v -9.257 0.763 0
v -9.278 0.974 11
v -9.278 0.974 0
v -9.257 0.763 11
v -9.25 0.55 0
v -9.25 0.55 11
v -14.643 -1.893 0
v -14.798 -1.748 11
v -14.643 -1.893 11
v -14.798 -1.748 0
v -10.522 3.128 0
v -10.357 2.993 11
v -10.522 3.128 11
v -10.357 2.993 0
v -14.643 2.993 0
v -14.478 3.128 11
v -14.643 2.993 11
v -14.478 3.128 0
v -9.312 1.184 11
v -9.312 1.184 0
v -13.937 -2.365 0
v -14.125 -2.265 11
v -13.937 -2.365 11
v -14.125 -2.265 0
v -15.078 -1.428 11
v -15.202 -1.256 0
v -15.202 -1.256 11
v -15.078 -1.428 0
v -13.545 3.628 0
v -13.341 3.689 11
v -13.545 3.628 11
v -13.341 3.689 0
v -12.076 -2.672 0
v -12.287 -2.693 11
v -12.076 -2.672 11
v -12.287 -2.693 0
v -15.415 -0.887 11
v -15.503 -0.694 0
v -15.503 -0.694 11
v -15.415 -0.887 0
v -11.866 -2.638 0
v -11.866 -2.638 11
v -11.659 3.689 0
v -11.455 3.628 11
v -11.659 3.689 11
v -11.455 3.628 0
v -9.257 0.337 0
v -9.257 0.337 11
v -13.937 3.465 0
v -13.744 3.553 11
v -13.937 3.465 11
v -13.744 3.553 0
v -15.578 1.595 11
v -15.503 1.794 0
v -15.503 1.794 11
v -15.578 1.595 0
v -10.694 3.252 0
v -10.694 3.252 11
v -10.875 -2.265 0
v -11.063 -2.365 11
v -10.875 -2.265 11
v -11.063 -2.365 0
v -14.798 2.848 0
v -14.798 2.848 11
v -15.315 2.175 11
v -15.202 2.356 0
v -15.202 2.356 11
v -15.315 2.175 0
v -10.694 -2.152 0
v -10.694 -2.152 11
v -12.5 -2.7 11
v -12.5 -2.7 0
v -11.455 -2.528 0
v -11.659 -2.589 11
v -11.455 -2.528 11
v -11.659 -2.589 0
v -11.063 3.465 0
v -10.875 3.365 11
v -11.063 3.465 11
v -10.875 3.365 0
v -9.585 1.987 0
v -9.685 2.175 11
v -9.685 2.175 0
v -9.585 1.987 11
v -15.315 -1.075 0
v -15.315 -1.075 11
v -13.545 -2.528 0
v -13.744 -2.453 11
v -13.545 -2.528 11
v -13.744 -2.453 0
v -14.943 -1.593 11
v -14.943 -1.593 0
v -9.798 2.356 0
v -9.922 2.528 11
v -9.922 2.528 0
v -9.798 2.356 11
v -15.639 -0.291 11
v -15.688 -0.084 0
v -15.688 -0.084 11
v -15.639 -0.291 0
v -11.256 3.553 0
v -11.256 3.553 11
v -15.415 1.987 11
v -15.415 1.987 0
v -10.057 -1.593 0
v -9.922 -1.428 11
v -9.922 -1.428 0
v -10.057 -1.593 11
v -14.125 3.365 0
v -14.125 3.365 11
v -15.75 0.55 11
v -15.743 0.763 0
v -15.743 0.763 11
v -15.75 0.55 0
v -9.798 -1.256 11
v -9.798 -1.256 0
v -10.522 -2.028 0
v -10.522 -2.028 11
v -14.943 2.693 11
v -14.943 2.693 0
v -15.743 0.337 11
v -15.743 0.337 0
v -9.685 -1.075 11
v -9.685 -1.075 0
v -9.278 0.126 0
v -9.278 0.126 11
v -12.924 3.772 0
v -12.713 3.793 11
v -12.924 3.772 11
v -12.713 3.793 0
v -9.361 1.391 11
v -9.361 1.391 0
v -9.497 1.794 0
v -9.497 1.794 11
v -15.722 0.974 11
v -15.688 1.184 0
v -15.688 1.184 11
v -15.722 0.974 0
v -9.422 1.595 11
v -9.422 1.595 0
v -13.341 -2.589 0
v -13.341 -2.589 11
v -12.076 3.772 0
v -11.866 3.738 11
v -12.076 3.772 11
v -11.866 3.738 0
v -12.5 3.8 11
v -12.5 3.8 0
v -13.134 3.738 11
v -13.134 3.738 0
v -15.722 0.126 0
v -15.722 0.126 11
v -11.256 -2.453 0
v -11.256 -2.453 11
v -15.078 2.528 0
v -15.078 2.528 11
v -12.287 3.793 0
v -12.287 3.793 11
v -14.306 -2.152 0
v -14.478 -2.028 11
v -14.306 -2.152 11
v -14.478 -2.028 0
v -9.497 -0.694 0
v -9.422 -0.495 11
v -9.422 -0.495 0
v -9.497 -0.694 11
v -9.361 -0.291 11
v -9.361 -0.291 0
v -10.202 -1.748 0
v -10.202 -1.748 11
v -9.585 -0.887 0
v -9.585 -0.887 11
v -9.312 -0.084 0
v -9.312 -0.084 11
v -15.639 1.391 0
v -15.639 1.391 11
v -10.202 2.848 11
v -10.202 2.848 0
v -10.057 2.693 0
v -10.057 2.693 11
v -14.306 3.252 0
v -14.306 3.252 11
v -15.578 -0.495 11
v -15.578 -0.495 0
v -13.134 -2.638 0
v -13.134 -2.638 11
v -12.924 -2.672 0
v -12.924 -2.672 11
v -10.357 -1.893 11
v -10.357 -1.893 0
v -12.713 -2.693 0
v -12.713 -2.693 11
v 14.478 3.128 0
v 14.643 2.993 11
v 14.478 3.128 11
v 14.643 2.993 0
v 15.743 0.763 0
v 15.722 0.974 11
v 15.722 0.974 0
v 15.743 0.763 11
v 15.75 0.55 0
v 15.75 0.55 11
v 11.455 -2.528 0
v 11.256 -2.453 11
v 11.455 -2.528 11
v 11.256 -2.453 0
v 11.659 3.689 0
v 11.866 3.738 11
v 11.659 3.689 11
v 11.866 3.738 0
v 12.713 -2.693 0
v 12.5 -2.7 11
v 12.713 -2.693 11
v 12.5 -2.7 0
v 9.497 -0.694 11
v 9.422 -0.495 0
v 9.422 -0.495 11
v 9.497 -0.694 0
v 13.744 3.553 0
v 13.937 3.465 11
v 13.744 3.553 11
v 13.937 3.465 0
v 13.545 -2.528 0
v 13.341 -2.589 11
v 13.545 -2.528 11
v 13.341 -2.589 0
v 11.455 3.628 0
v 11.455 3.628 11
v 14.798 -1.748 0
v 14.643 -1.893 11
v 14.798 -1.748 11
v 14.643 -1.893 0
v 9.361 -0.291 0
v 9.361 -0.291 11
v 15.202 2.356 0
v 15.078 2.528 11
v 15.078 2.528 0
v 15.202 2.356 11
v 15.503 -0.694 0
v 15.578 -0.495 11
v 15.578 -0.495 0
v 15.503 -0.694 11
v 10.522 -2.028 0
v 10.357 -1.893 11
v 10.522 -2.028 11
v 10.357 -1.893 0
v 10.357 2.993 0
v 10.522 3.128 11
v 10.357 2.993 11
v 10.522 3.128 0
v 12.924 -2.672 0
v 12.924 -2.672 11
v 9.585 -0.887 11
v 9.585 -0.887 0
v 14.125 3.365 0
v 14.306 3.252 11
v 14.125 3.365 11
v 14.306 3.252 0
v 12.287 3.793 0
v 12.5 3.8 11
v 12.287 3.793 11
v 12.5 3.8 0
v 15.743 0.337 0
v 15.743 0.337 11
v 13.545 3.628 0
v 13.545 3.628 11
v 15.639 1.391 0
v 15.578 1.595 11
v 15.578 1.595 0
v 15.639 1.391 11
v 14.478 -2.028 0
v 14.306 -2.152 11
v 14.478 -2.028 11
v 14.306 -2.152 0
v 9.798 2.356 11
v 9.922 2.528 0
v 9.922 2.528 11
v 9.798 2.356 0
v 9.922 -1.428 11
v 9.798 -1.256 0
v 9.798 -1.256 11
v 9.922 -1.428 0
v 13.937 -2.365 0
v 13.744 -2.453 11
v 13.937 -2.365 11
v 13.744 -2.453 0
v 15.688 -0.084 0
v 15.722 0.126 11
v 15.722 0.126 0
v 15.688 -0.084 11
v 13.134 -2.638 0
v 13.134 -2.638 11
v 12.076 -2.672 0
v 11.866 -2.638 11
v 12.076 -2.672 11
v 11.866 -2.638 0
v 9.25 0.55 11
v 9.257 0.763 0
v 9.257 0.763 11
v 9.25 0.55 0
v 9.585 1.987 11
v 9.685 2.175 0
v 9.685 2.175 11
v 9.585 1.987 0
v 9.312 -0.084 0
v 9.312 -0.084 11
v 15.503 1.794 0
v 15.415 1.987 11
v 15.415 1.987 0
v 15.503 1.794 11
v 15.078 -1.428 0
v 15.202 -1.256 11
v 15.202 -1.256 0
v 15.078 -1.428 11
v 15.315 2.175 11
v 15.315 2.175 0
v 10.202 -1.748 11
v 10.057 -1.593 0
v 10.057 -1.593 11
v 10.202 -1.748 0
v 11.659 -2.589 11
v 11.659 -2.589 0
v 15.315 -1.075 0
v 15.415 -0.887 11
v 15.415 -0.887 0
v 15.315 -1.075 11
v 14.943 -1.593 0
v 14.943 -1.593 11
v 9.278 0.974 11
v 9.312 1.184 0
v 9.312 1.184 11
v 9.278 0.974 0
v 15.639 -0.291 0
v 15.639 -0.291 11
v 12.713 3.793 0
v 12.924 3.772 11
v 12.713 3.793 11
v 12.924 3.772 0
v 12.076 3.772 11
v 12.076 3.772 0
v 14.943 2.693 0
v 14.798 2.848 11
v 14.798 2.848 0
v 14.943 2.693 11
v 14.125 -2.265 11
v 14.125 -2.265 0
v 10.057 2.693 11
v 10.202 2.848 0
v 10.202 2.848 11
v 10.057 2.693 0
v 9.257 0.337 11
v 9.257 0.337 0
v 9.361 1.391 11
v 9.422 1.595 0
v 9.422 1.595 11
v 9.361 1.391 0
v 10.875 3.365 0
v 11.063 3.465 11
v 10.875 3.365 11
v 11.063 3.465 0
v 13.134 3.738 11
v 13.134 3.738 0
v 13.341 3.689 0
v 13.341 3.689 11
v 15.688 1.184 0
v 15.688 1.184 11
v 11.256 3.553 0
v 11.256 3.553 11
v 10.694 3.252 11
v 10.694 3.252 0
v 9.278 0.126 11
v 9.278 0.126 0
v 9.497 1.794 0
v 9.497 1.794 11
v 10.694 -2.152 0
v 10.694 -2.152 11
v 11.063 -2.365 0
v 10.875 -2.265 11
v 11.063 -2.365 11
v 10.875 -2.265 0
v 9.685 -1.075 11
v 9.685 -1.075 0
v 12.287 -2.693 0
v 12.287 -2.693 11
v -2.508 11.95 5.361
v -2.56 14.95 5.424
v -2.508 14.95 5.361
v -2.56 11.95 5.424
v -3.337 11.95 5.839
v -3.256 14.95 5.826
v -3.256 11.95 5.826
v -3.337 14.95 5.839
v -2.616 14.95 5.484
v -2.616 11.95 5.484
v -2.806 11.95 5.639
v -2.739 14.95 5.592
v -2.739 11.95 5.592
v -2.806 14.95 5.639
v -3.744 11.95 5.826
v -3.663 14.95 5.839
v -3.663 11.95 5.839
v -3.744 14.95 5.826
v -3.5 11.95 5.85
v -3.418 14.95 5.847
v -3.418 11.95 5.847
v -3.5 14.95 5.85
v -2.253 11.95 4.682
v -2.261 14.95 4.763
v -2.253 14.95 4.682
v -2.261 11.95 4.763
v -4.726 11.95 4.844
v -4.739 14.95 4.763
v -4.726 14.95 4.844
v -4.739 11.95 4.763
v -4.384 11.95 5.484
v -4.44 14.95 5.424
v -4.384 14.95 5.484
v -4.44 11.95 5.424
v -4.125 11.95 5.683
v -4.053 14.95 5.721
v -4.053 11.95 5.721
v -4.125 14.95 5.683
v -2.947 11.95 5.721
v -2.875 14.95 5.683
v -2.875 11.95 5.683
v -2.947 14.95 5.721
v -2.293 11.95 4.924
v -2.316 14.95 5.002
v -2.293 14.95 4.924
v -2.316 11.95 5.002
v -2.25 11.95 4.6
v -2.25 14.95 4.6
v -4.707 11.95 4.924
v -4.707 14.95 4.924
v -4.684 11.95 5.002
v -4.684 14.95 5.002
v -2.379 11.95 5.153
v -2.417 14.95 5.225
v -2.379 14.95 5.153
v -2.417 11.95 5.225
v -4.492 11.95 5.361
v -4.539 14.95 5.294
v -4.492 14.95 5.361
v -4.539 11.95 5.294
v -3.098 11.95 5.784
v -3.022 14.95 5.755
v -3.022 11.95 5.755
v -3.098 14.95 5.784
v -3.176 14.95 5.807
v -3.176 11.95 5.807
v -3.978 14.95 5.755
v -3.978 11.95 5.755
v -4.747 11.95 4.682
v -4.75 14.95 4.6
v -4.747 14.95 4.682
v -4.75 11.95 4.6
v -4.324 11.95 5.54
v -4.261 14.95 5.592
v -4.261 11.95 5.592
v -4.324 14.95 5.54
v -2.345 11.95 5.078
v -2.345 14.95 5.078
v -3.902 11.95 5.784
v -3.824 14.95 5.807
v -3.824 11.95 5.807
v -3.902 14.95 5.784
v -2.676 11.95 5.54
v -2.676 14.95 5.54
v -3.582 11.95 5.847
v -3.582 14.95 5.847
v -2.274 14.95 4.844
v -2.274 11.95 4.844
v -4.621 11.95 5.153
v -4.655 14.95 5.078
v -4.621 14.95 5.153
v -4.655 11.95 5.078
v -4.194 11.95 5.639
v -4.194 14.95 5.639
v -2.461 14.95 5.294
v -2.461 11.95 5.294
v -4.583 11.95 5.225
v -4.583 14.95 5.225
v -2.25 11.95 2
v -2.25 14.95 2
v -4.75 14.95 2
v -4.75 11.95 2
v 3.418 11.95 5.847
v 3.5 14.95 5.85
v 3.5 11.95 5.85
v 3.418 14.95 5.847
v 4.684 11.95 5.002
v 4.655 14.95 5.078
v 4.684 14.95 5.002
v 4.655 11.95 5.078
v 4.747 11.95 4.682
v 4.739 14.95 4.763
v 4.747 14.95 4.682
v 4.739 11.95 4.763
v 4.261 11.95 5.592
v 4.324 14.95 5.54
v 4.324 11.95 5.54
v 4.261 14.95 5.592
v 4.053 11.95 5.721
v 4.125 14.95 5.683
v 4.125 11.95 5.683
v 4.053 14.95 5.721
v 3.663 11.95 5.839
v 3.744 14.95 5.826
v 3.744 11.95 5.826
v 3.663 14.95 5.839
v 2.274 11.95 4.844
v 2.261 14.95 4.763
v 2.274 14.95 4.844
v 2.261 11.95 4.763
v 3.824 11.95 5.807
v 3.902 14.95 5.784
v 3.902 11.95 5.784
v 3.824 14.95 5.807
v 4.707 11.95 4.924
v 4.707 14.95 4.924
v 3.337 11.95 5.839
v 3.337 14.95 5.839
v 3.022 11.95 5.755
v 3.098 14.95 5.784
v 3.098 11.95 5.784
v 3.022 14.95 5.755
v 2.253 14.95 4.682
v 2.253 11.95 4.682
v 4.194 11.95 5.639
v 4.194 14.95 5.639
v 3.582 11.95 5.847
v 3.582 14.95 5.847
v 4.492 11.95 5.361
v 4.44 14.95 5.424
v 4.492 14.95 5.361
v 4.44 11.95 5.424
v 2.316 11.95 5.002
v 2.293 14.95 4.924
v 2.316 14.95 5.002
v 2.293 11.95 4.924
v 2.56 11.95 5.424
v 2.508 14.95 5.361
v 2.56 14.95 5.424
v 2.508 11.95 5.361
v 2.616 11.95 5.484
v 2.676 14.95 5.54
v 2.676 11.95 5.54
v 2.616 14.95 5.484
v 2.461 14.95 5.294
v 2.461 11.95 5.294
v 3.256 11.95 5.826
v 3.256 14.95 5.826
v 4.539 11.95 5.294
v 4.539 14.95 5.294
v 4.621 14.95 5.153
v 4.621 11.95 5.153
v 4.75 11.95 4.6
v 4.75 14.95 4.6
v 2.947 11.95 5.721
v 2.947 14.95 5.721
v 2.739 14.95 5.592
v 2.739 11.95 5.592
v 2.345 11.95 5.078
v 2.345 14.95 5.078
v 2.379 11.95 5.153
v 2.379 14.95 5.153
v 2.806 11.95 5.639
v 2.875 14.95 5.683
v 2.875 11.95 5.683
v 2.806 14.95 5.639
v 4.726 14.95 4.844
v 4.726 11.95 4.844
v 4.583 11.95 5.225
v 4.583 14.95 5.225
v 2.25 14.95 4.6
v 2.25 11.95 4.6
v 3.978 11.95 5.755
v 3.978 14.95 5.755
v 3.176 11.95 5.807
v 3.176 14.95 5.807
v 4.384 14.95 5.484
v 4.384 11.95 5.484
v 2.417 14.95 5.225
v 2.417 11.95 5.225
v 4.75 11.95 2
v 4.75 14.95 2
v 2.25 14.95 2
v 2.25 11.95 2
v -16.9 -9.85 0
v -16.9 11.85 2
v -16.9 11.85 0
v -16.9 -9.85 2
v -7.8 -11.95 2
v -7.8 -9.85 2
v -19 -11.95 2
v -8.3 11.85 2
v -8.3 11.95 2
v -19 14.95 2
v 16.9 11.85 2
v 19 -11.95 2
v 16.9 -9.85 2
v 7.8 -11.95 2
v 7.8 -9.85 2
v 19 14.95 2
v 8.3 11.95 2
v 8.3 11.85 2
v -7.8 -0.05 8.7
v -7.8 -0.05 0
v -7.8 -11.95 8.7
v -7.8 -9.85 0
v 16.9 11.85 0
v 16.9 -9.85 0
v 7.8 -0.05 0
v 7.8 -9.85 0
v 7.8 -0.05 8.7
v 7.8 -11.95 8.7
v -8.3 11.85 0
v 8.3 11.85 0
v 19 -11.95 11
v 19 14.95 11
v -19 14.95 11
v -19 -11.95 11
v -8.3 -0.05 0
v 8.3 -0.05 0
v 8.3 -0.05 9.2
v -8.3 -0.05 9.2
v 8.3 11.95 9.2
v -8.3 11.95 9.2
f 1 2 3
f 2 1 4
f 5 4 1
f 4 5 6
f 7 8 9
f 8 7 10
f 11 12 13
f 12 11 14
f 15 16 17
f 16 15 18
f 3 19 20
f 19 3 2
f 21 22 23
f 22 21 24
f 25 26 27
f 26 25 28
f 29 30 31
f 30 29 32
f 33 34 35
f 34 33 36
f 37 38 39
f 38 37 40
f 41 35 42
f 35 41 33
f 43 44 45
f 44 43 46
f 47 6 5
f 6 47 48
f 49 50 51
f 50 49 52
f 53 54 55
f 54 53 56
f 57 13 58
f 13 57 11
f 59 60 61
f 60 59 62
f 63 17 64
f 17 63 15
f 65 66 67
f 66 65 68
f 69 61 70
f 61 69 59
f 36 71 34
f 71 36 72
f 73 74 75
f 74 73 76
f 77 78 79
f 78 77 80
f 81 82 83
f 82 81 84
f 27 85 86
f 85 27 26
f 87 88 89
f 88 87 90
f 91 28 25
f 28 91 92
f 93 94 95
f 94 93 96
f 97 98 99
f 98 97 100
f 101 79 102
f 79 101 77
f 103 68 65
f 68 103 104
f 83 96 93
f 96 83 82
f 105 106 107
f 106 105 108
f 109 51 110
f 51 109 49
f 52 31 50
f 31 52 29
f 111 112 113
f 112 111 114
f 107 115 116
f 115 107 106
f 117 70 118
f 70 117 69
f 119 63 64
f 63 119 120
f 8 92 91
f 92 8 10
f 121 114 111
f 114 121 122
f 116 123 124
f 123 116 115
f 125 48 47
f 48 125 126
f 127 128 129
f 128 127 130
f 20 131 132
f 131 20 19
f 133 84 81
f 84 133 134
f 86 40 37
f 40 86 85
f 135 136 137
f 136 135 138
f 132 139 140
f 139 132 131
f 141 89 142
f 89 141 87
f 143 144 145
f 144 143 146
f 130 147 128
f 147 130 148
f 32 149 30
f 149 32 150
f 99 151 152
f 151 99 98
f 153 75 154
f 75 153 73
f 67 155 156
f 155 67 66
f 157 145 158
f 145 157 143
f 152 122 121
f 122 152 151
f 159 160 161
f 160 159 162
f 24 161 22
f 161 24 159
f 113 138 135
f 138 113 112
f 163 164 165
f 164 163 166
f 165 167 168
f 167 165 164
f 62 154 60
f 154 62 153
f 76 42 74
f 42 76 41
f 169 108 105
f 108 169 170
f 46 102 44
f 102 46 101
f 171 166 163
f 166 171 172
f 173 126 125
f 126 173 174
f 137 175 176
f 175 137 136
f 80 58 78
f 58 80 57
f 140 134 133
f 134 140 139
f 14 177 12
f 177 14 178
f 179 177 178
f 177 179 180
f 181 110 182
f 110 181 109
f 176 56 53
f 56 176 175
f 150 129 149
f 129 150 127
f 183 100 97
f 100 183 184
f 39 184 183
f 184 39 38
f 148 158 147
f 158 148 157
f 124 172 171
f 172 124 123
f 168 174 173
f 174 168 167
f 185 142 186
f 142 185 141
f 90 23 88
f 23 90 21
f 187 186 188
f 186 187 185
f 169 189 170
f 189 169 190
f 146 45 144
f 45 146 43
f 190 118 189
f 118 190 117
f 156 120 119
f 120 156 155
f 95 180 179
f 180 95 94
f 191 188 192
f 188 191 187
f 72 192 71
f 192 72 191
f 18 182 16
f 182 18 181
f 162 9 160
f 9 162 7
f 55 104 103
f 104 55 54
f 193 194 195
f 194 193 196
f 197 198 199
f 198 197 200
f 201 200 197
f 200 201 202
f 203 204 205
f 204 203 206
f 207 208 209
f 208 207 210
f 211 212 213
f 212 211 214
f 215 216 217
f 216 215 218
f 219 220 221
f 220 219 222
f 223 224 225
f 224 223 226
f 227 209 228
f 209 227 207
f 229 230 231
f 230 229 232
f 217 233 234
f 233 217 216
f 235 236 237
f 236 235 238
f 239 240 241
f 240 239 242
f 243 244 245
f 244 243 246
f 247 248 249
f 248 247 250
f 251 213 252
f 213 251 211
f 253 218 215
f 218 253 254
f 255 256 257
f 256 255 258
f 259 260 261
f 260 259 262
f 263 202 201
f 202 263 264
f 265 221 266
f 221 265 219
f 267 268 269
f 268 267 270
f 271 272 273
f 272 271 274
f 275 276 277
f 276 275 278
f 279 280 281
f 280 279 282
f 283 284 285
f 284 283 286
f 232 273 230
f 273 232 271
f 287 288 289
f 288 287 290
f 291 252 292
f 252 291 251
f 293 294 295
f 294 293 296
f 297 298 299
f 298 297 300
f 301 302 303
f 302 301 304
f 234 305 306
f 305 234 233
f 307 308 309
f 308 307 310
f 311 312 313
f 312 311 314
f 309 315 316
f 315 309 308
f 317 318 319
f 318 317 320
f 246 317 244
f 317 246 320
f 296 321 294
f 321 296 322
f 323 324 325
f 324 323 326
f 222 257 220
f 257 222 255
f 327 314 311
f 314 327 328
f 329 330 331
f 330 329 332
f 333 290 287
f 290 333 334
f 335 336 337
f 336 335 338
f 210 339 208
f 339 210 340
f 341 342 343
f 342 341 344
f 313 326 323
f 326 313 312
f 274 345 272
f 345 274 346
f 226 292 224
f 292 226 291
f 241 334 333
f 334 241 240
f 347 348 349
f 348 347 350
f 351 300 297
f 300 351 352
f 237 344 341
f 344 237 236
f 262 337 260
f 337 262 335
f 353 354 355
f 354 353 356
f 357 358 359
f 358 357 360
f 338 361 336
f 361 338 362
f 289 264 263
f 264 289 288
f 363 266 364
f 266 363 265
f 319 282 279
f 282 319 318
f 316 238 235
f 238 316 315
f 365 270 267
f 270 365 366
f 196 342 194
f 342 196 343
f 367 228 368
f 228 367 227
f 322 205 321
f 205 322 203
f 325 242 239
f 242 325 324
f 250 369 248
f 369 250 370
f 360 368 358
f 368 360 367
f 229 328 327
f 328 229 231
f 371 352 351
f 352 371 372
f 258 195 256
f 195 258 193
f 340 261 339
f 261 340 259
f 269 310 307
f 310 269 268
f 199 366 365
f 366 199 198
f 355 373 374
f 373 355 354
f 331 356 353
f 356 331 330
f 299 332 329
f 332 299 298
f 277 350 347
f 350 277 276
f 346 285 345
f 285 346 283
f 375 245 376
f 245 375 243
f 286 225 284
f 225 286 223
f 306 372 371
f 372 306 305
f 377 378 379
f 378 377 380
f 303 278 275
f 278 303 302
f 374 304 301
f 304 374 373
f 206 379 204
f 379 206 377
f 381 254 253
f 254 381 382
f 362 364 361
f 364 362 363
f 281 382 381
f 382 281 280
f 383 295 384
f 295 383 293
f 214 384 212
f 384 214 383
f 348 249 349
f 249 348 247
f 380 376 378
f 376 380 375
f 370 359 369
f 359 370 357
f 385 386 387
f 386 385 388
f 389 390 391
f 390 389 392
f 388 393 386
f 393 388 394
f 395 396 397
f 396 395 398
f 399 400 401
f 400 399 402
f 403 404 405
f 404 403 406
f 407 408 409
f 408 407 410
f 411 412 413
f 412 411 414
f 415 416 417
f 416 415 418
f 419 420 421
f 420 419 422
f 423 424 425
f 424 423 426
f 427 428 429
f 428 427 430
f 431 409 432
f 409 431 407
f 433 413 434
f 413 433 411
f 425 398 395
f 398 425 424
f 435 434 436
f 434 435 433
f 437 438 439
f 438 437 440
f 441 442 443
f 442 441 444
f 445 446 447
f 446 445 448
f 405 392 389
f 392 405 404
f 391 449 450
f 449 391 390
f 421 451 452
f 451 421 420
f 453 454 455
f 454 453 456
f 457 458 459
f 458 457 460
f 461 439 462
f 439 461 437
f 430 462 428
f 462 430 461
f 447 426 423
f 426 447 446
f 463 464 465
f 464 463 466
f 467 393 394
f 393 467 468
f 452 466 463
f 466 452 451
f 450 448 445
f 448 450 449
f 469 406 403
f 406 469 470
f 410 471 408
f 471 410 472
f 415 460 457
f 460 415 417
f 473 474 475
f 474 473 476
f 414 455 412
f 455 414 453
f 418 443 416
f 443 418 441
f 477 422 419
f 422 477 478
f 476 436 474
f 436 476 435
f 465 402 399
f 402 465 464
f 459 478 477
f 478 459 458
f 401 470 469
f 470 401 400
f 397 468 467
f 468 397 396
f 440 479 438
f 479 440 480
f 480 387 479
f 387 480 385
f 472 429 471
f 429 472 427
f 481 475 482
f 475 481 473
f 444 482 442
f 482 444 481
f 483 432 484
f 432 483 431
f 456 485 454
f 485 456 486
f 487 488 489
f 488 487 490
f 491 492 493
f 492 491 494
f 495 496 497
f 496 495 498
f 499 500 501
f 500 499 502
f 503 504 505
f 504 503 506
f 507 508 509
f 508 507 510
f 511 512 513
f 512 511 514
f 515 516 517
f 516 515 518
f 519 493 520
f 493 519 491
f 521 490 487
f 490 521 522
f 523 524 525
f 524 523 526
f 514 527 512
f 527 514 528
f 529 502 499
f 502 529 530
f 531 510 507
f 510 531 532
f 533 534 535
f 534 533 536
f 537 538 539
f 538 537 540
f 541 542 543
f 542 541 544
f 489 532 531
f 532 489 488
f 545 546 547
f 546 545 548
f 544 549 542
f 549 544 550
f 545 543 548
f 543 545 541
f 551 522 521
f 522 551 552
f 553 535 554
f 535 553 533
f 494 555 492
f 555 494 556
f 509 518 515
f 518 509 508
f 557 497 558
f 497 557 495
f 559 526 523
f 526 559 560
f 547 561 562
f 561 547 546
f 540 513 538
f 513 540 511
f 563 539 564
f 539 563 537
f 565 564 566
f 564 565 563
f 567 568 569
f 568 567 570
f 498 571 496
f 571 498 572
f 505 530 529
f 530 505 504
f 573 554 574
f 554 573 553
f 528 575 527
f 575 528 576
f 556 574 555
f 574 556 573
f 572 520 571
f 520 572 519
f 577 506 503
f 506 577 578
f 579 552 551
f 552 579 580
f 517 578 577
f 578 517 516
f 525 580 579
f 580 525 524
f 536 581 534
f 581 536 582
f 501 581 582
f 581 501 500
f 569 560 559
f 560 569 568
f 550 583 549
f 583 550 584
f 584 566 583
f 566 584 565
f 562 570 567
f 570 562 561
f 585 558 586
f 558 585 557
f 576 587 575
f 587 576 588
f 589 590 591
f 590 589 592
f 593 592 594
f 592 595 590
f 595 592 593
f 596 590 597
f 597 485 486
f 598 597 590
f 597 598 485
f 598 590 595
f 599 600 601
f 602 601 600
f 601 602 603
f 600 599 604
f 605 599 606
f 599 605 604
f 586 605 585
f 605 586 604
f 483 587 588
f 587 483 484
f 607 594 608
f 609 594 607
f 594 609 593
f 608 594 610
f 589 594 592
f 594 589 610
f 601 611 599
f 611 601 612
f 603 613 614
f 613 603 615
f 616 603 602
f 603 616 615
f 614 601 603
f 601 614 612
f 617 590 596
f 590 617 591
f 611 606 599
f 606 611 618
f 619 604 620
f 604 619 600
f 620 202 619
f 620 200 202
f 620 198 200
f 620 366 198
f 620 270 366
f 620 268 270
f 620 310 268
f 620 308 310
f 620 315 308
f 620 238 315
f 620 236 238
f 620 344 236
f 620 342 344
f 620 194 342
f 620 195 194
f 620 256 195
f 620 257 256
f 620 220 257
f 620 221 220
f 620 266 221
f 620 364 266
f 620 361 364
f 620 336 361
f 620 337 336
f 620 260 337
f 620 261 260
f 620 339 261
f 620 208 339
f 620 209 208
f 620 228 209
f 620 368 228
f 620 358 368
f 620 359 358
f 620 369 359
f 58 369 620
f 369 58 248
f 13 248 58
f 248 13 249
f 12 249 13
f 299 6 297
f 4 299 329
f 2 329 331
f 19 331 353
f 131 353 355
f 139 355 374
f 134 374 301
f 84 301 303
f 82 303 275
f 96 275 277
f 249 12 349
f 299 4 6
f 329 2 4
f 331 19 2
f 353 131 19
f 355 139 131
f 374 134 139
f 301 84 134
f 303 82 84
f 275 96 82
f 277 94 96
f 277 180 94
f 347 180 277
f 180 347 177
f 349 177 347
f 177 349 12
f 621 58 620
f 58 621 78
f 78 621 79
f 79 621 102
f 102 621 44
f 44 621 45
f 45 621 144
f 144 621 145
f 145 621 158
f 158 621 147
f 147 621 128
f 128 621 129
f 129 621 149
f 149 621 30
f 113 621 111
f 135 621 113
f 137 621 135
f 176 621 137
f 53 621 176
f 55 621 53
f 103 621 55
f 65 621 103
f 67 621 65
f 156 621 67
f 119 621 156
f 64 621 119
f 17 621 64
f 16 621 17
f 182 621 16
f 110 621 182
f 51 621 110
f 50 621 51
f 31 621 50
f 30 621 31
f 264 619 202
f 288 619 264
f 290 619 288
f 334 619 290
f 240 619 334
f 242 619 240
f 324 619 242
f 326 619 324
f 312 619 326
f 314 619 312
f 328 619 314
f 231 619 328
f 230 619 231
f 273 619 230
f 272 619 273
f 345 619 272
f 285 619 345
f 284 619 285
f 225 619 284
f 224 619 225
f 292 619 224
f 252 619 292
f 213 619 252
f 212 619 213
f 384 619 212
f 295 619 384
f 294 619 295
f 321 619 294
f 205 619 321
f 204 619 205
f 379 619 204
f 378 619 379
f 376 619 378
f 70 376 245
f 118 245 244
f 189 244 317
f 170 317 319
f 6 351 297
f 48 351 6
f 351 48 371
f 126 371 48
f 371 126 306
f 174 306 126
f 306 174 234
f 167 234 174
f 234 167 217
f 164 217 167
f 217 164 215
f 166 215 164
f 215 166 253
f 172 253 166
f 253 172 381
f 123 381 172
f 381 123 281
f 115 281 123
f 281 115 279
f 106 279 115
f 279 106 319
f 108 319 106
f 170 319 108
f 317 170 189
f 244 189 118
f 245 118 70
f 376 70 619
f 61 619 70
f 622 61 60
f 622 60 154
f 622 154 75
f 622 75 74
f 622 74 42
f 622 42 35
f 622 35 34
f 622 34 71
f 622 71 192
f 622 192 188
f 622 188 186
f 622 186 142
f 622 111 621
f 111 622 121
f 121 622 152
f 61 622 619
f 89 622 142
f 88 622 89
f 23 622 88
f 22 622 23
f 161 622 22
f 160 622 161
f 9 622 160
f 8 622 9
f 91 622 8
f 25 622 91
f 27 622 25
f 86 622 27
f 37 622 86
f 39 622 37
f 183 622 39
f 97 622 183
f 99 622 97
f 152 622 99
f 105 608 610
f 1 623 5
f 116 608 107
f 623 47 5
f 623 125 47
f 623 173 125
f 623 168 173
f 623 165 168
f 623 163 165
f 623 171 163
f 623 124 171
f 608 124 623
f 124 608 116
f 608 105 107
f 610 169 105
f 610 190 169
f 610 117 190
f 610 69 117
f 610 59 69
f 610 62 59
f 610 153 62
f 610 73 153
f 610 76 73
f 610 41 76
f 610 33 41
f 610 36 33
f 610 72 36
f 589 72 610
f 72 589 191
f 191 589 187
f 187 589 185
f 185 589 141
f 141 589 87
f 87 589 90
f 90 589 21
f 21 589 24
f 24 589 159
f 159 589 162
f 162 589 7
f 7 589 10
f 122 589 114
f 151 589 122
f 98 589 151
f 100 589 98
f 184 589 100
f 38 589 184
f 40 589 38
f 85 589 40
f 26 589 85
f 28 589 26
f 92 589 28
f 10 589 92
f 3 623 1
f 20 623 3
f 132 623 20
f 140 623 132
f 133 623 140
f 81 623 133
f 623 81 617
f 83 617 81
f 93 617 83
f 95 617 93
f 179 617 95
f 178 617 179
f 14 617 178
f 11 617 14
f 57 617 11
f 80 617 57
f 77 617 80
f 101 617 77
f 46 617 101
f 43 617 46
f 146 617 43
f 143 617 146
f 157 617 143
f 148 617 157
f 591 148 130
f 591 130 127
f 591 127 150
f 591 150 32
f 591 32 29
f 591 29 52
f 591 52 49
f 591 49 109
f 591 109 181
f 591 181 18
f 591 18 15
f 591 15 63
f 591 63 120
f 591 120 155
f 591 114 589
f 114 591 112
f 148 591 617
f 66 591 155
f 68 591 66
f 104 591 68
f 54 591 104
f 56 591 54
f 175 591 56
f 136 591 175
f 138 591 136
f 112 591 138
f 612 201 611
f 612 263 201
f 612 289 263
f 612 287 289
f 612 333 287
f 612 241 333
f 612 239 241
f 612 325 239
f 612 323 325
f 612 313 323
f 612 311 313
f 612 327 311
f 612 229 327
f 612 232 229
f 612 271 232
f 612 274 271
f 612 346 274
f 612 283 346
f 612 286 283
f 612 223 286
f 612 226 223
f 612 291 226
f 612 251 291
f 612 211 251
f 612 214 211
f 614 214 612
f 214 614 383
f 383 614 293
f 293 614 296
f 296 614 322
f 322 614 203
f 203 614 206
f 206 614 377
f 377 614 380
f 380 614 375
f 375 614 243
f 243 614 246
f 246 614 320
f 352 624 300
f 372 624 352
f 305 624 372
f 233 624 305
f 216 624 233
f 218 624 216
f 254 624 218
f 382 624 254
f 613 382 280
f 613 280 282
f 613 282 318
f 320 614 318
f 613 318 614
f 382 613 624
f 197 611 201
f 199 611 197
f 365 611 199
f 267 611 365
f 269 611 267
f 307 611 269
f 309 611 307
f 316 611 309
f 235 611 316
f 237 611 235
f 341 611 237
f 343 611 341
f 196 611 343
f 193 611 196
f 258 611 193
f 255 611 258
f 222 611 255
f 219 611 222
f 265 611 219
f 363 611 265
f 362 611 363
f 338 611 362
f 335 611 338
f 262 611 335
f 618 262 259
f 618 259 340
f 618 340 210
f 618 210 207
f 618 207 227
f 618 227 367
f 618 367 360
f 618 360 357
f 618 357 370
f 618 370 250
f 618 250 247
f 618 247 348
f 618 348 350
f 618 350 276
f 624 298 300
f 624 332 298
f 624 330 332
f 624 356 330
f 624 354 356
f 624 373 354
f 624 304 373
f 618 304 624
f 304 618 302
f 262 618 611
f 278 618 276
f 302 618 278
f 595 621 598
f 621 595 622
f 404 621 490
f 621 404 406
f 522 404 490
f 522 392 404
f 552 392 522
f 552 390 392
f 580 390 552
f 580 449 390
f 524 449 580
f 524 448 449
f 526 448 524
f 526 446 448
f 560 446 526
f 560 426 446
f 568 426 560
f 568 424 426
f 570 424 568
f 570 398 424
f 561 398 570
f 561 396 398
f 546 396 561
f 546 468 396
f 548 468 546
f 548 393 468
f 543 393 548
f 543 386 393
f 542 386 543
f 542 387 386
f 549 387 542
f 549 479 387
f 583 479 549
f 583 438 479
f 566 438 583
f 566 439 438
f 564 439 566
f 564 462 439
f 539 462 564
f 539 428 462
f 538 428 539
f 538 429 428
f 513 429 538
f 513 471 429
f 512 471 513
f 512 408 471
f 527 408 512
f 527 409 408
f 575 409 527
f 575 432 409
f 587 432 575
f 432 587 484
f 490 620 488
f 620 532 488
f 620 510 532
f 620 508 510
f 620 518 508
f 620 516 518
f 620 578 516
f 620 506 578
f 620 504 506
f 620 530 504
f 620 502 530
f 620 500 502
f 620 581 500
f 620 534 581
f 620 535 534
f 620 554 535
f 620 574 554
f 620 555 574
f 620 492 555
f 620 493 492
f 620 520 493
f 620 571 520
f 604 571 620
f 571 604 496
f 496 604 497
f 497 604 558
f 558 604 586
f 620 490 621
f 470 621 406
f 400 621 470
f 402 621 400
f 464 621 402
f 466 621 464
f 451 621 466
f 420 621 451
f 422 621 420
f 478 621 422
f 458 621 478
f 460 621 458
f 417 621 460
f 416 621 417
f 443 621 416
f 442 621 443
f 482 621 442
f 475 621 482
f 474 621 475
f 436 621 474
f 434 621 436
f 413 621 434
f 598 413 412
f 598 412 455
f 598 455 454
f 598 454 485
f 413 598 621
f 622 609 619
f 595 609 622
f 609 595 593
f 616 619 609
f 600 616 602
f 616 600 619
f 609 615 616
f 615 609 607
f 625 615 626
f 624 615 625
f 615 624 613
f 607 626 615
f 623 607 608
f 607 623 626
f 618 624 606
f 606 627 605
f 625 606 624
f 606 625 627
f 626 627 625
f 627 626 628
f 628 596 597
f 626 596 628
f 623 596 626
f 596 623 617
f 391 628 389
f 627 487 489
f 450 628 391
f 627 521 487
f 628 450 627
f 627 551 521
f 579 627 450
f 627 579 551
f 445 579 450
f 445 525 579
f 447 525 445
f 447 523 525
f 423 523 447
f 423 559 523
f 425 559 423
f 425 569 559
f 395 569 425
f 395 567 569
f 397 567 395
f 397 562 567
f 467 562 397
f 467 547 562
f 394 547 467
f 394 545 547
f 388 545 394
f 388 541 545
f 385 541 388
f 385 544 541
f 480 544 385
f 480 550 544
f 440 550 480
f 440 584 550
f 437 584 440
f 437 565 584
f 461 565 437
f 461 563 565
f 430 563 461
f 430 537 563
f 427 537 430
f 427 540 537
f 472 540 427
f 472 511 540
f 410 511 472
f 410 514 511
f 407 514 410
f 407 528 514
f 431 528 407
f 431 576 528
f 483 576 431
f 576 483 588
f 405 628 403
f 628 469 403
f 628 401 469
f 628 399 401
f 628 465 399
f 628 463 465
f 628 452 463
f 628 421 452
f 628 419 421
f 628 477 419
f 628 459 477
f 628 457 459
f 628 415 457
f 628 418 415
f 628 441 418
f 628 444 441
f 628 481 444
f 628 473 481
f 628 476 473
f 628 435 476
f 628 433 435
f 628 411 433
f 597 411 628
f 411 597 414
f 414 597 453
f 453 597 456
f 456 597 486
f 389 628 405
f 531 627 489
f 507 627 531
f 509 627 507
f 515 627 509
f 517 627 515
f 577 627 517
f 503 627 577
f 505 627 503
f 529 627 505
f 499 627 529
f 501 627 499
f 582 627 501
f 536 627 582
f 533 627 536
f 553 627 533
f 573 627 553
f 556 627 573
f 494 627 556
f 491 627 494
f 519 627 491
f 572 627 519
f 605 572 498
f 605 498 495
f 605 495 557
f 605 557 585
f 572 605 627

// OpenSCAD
// XT60 电源接头压块 xt60_clamp_16p6x9p2x23p9 (v4.10, 2026-09-16) — 平顶块, 2×M6 @ 25 横跨接头, 大扁头坐顶面
// 接头 XT60H-M 两段: 插合本体 15.6×8.2 长11.9 (开口侧, 宽为用户指定, 图纸 15.4) / 出线护套 16.6×9.2 长12 (堵头侧, 图纸 16.4); 本体上下各比护套缩 0.5
// 现行: 压块 38×26.9×11 + 件 2 底板垫片 (38×26.9×2 + 凸台 15.4×11.9×0.5 + 止口四边高 2: 侧/前宽 2, 后边宽 3) = 38×26.9×13 长方体
// 插入靠堵头 + 后边框挡, 拔出靠窄槽台阶挡护套; 堵头厚3 带 2 个 U 型出线口 (Φ2.5 圆心高 4.6 间距 7, 平底 = 后边框顶 z 2); 孔心到开口面 12.5
// 版本历史 (按顺序):
// v4.1 用户指定宽度 16.6 / 15.6 紧配不留余量 => 阶梯槽: 本体段 15.6×8.6 (压紧0.1) + 护套段 16.6×9.0 (压紧0.2); 本体底下垫 0.5 垫片 (单独件 xt60_shim)
// v4.2 用户「所有间隙都改为0」: 台阶对齐 (零窜动), 垫片 = 本体底面 15.6×11.9×0.5; M6 过孔未动
// v4.3 用户「应该是8.7和9.2」: 高度过盈也 0, 槽顶 = 接头顶 (护套 9.2 / 本体 8.7)
// v4.4 用户「厚度改为11mm」: 件高 11 定死, 槽顶厚 1.8 (护套段) / 2.3 (本体段)
// v4.5 用户: 垫片会掉 => 件 2 改底板垫片 = 压块外形 38×26.9 × 厚 2 + 本体下凸台 0.5, 2×Φ6.5 同压块孔, M6 定位
// v4.6 用户「出线端就都在中央，直径都改为2.5mm」: U 口 Φ2.5 零余量, 圆心 = 护套高/2 = 4.6
// v4.7 用户: 上下件嵌套卡在一起 => 止口 2×2 (左右 X 端全长 + 开口端两段, 槽口断开; 底板凸起 / 压块底面台阶),
//      堵头处底板舌头 (高到针轴, 顶面 R1.25) 与 U 口扣成 Φ2.5 圆
// v4.8 用户「两个件就留0.1mm装配」: 嵌套面单边 0.1 (舌头宽 2.3 / 凸台宽 15.4)
// v4.9 用户「组合后从外边看要是一个立方体」: 压块台阶 2.1 宽 × 2.0 高 (高度不留缝, 外观平齐)
// v4.10 用户: 四边都加凸台 / 出线处削 / 后边宽 3 => 取消舌头; 止口四边高 2 (侧/前宽 2, 后边宽 3 全宽); 线底 3.35 > 2 不削
// v3 把两段装反了, v4 按用户实物纠正: 没挡板的开口端是小的本体, 挡板端是大的护套
// ⚠ 参数与 build_stl.py 手工同步 (build_stl.py 是准绳, 带全部校核)

body_w   = 15.6; body_h   = 8.2;    // 插合本体 (开口侧), 宽用户指定
sheath_w = 16.6; sheath_h = 9.2;    // 出线护套 (堵头侧), 宽用户指定
body_l   = 11.9; sheath_l = 12.0;
xt_l     = body_l + sheath_l;       // 23.9
body_lift = (sheath_h - body_h)/2;  // 0.5

side_clr_s = 0;     side_clr_b = 0;     // 紧配, 不留余量 (用户 09-16)
preload_s  = 0;     preload_b  = 0;     // 护套段 / 本体段 压紧量 (用户: 槽顶 9.2 / 8.7)
step_margin = 0;    // 槽台阶比接头台阶往开口侧提前 (所有间隙 0)
assy_clr = 0.1;                             // 两件嵌套面单边装配间隙 (必须在 shim_clr 之前定义)
shim_clr = assy_clr; shim_open_inset = 0; shim_back_gap = 0;   // 凸台两侧留装配间隙

htop     = 11;    // 件高 (用户指定)
cap_t    = 3;     // 堵头厚
wire_d   = 2.5;   // 出线口径 = 线径, 零余量
wire_pitch = 7;   // 出线口间距
wire_zc  = sheath_h/2;   // 4.6 针轴线
pitch    = 25;    // 孔距 (= 网格节距, 横跨接头)
hole_d   = 6.5;   // M6 通孔
end_m    = 6.5;   // 孔心到 X 端面
hole_y_open = 12.5;   // 孔心到开口面

ch_w_b = body_w + 2*side_clr_b;             // 15.6
ch_h_b = body_lift + body_h - preload_b;    //  8.7
ch_w_s = sheath_w + 2*side_clr_s;           // 16.6
ch_h_s = sheath_h - preload_s;              //  9.2
t_top  = htop - ch_h_s;                     // 1.8 槽顶厚 (护套段)
hx     = pitch/2;
half_l = hx + end_m;                        // 19
y_open  = -xt_l/2;                          // -11.95
y_xstep = y_open + body_l;                  //  -0.05 接头台阶
y_step  = y_xstep - step_margin;            //  -0.05 槽台阶 (= 接头台阶)
y_capi  = xt_l/2;                           //  11.95
depth   = xt_l + cap_t;                     //  26.9

base_t  = 2;                                // 底板垫片厚 (用户)
rim_w   = 2; rim_h = 2;                     // 止口 (用户「厚度2mm，高度2mm」)
shim_t  = body_lift;                        // 0.5 凸台高
shim_w  = ch_w_b - 2*shim_clr;              // 15.4
back_rim_w = cap_t;                         // 3 后边止口宽
ledge = wire_zc - wire_d/2;                 // 3.35 线底
shim_y0 = y_open + shim_open_inset;         // -11.95
shim_y1 = y_xstep - shim_back_gap;          //  -0.05

module u_slot(xc) {
    translate([xc, y_capi - 1, wire_zc]) rotate([-90, 0, 0])
        cylinder(h = cap_t + 2, d = wire_d, $fn = 96);
    translate([xc - wire_d/2, y_capi - 1, -1]) cube([wire_d, cap_t + 2, wire_zc + 1]);
}

// 止口区域: e>0 时向外/向下延伸 (给压块切台阶用)
module rim_region(e = 0, gw = 0, gh = 0) {
    w = rim_w + gw; h = rim_h + gh;
    for (sx = [-1, 1]) {
        translate([sx > 0 ? half_l - w : -half_l - e, y_open - e, -e]) cube([w + e, depth + 2*e, h + e]);
        translate([sx > 0 ? ch_w_b/2 : -half_l - e, y_open - e, -e]) cube([half_l - ch_w_b/2 + e, w + e, h + e]);
    }
    wb = back_rim_w + gw;
    translate([-half_l - e, y_capi + cap_t - wb, -e]) cube([2*half_l + 2*e, wb + e, h + e]);   // 后边 (出线边)
}

module xt60_clamp_16p6x9p2x23p9() {
    difference() {
        translate([-half_l, y_open, 0]) cube([2*half_l, depth, htop]);
        // 阶梯槽: 本体段 (开口 -> 槽台阶, 窄低) + 护套段 (槽台阶 -> 堵头内面, 宽高)
        translate([-ch_w_b/2, y_open - 1, -1]) cube([ch_w_b, y_step - y_open + 1, ch_h_b + 1]);
        translate([-ch_w_s/2, y_step,     -1]) cube([ch_w_s, y_capi - y_step,     ch_h_s + 1]);
        for (sx = [-1, 1])
            translate([sx*hx, y_open + hole_y_open, -1]) cylinder(h = htop + 2, d = hole_d, $fn = 96);
        for (sx = [-1, 1]) u_slot(sx * wire_pitch/2);
        rim_region(1, assy_clr, 0);   // 底面止口台阶: 宽 + 装配间隙, 高贴合
    }
}

// 件 2 底板垫片: 装配坐标 底板 z∈[-base_t,0] + 凸台 z∈[0,shim_t]
module xt60_shim_38x26p9x2p5() {
    difference() {
        union() {
            translate([-half_l, y_open, -base_t]) cube([2*half_l, depth, base_t]);
            translate([-shim_w/2, shim_y0, 0]) cube([shim_w, shim_y1 - shim_y0, shim_t]);
            difference() {   // 止口边框 (线底低于边框顶时在出线处削)
                rim_region(0);
                if (ledge < rim_h) for (sx = [-1, 1]) translate([sx*wire_pitch/2 - wire_d/2, y_capi - 1, ledge]) cube([wire_d, back_rim_w + 2, rim_h]);
            }
        }
        for (sx = [-1, 1])
            translate([sx*hx, y_open + hole_y_open, -base_t - 1]) cylinder(h = base_t + shim_t + 2, d = hole_d, $fn = 96);
    }
}

xt60_clamp_16p6x9p2x23p9();
%xt60_shim_38x26p9x2p5();   // 装配位置预览 (单独导出时去掉 % 并注释掉上一行)
